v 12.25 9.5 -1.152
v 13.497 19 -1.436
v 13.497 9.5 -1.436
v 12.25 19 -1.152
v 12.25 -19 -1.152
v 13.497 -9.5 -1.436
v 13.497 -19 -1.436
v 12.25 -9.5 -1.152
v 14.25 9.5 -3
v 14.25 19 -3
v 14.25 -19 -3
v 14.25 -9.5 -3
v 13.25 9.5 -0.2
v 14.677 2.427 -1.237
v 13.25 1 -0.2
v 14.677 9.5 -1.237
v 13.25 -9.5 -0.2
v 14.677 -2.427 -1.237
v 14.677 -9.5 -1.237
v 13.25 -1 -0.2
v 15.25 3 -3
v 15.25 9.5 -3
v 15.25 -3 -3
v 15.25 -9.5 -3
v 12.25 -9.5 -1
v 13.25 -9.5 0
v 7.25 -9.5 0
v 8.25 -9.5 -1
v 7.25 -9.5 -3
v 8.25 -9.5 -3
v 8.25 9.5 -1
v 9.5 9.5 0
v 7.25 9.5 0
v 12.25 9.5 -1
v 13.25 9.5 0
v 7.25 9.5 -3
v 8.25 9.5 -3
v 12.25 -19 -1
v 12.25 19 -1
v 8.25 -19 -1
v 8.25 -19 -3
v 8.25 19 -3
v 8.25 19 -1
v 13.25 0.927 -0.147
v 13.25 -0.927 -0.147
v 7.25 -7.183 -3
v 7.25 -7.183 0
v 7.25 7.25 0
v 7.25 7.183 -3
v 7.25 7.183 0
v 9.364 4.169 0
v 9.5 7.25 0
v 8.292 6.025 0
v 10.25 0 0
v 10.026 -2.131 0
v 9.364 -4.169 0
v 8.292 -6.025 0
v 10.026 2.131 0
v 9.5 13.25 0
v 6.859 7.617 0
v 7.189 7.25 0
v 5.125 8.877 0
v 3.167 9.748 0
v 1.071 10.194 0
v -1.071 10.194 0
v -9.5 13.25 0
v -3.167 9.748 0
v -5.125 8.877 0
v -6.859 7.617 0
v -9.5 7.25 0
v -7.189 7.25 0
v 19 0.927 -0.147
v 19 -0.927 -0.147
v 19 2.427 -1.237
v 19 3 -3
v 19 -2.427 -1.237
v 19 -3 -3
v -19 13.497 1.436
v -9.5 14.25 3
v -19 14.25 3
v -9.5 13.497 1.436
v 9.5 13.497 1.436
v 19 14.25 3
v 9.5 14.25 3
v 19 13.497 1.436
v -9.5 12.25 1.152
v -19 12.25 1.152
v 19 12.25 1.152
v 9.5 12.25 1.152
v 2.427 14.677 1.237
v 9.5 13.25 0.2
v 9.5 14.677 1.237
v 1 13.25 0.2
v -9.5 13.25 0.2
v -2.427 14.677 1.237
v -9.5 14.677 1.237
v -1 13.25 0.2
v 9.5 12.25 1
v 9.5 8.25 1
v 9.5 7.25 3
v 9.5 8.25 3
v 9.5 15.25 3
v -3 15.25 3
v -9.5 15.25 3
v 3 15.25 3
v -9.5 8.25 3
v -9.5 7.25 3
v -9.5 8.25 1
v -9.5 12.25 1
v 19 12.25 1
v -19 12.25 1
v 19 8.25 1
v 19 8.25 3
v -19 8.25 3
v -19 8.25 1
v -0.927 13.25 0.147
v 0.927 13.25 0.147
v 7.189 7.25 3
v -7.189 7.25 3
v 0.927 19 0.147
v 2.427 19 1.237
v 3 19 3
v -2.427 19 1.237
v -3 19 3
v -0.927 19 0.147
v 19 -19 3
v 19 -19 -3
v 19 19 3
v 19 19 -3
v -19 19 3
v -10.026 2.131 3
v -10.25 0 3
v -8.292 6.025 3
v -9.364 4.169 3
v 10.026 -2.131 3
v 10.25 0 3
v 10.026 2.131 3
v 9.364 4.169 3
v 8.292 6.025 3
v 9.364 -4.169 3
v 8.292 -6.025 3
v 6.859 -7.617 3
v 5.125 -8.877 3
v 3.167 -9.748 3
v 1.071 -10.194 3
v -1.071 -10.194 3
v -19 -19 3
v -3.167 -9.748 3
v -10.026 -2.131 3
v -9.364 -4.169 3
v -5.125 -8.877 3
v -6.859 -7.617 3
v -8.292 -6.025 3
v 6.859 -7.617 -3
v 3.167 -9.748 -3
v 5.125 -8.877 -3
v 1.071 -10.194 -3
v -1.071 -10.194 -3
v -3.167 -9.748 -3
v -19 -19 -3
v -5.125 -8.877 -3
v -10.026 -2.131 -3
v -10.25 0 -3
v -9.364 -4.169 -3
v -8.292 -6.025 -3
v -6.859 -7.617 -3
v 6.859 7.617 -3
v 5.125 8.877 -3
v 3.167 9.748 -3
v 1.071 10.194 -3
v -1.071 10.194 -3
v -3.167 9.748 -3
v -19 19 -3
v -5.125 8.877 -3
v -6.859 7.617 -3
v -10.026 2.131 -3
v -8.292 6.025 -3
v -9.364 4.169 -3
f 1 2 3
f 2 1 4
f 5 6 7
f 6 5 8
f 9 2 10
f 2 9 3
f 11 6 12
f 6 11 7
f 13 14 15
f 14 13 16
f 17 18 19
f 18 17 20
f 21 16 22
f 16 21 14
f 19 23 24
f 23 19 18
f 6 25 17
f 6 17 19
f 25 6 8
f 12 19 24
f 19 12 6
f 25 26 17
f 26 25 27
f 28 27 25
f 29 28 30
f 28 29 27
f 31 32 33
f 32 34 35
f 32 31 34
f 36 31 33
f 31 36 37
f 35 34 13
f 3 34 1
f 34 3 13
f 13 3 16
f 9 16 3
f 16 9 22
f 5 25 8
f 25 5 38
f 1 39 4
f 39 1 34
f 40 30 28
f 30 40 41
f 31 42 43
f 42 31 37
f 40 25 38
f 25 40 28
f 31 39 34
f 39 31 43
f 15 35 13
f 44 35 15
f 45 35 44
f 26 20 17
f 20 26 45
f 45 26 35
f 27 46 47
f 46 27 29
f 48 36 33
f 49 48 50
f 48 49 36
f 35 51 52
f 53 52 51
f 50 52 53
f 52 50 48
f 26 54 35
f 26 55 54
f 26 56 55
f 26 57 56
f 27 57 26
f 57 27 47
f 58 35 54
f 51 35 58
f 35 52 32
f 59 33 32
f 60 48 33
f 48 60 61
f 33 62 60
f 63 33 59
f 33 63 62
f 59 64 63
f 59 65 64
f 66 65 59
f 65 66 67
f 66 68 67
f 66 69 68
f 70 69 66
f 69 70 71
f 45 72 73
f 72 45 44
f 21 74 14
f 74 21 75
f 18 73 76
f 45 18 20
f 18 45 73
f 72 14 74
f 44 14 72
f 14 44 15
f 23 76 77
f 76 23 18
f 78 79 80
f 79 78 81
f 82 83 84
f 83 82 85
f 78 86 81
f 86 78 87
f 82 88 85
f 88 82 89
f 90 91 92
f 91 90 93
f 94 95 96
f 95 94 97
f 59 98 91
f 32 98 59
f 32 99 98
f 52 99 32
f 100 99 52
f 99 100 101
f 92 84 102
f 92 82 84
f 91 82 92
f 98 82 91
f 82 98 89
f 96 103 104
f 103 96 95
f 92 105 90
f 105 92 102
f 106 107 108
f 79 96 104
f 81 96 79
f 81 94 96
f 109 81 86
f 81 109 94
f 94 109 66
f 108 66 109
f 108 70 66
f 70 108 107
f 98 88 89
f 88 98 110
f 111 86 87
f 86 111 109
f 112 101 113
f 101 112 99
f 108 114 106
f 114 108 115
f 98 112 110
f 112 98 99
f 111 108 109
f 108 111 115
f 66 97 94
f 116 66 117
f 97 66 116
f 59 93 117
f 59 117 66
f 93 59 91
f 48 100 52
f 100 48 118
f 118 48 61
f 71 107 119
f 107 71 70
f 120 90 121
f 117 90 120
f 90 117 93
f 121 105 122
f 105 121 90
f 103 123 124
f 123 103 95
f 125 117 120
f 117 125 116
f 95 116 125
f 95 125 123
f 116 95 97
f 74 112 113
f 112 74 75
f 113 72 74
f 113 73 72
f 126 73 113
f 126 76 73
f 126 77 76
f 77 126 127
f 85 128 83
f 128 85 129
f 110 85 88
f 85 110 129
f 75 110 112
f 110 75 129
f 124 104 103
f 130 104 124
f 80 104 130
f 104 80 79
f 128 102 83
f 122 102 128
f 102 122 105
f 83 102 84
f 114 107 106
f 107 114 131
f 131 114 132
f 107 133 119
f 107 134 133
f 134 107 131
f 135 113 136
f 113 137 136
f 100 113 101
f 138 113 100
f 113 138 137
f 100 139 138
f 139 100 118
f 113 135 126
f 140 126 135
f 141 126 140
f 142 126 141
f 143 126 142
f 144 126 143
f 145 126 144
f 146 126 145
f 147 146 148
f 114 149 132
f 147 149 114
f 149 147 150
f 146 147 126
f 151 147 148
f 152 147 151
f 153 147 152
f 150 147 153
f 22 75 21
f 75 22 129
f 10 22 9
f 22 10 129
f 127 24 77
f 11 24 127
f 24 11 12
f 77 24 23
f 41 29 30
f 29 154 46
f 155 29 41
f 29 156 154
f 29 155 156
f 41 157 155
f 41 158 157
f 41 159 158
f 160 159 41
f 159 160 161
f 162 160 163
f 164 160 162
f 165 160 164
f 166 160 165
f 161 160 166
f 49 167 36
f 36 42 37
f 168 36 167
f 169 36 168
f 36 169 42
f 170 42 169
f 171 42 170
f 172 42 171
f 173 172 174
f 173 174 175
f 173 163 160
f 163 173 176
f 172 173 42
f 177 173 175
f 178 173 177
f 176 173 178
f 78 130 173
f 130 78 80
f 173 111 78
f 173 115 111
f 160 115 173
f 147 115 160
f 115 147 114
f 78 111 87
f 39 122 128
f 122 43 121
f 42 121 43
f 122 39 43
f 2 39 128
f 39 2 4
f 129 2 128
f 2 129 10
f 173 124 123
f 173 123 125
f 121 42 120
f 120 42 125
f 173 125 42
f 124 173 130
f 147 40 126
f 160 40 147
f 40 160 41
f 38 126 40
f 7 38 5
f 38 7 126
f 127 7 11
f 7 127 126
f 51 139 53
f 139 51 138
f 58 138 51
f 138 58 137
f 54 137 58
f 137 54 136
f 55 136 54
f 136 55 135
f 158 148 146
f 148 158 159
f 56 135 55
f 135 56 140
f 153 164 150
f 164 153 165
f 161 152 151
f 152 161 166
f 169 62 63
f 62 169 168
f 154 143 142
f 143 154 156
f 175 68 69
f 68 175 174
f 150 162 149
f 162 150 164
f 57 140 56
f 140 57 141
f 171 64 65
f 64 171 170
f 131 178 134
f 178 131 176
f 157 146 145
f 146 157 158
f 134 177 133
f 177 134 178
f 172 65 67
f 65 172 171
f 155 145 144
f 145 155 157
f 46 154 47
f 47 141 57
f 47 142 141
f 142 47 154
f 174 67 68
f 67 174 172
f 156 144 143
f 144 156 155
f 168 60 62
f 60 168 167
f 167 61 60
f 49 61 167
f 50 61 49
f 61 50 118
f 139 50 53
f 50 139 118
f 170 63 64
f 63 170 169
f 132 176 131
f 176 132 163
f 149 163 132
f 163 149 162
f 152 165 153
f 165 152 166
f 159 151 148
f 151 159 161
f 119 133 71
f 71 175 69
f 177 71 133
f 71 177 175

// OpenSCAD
//Radiator Holder
//SatNOGS project

width = 38;
mast = 20.5;
element = 4;

module element_gutter() {
	union() {
		translate([mast/2+element/2,0,0])
			cylinder(d=element,h=width+1,center=true);
		translate([mast/2+element/2,0,0])
			cylinder(d=6,h=width/2,center=true);
		translate([mast/2,0,0])
			cube([element,element,width+1],center=true);
		translate([mast/2,0,0])
			cube([6,6,width/2],center=true);
		rotate(90,[0,1,0])
			translate([0,0,mast/2])
			cylinder(d=6,h=mast,center=true);
	}
}

module holder() {
	difference() {
		cube([width,width,6], center=true);
		cylinder(d=mast,h=width,center=true);
		translate([0,0,-3])
			rotate(90,[1,0,0])
				element_gutter();
		rotate(90,[0,0,1])
			translate([0,0,3])
				rotate(90,[1,0,0])
					element_gutter();
	}
}
	

holder();
